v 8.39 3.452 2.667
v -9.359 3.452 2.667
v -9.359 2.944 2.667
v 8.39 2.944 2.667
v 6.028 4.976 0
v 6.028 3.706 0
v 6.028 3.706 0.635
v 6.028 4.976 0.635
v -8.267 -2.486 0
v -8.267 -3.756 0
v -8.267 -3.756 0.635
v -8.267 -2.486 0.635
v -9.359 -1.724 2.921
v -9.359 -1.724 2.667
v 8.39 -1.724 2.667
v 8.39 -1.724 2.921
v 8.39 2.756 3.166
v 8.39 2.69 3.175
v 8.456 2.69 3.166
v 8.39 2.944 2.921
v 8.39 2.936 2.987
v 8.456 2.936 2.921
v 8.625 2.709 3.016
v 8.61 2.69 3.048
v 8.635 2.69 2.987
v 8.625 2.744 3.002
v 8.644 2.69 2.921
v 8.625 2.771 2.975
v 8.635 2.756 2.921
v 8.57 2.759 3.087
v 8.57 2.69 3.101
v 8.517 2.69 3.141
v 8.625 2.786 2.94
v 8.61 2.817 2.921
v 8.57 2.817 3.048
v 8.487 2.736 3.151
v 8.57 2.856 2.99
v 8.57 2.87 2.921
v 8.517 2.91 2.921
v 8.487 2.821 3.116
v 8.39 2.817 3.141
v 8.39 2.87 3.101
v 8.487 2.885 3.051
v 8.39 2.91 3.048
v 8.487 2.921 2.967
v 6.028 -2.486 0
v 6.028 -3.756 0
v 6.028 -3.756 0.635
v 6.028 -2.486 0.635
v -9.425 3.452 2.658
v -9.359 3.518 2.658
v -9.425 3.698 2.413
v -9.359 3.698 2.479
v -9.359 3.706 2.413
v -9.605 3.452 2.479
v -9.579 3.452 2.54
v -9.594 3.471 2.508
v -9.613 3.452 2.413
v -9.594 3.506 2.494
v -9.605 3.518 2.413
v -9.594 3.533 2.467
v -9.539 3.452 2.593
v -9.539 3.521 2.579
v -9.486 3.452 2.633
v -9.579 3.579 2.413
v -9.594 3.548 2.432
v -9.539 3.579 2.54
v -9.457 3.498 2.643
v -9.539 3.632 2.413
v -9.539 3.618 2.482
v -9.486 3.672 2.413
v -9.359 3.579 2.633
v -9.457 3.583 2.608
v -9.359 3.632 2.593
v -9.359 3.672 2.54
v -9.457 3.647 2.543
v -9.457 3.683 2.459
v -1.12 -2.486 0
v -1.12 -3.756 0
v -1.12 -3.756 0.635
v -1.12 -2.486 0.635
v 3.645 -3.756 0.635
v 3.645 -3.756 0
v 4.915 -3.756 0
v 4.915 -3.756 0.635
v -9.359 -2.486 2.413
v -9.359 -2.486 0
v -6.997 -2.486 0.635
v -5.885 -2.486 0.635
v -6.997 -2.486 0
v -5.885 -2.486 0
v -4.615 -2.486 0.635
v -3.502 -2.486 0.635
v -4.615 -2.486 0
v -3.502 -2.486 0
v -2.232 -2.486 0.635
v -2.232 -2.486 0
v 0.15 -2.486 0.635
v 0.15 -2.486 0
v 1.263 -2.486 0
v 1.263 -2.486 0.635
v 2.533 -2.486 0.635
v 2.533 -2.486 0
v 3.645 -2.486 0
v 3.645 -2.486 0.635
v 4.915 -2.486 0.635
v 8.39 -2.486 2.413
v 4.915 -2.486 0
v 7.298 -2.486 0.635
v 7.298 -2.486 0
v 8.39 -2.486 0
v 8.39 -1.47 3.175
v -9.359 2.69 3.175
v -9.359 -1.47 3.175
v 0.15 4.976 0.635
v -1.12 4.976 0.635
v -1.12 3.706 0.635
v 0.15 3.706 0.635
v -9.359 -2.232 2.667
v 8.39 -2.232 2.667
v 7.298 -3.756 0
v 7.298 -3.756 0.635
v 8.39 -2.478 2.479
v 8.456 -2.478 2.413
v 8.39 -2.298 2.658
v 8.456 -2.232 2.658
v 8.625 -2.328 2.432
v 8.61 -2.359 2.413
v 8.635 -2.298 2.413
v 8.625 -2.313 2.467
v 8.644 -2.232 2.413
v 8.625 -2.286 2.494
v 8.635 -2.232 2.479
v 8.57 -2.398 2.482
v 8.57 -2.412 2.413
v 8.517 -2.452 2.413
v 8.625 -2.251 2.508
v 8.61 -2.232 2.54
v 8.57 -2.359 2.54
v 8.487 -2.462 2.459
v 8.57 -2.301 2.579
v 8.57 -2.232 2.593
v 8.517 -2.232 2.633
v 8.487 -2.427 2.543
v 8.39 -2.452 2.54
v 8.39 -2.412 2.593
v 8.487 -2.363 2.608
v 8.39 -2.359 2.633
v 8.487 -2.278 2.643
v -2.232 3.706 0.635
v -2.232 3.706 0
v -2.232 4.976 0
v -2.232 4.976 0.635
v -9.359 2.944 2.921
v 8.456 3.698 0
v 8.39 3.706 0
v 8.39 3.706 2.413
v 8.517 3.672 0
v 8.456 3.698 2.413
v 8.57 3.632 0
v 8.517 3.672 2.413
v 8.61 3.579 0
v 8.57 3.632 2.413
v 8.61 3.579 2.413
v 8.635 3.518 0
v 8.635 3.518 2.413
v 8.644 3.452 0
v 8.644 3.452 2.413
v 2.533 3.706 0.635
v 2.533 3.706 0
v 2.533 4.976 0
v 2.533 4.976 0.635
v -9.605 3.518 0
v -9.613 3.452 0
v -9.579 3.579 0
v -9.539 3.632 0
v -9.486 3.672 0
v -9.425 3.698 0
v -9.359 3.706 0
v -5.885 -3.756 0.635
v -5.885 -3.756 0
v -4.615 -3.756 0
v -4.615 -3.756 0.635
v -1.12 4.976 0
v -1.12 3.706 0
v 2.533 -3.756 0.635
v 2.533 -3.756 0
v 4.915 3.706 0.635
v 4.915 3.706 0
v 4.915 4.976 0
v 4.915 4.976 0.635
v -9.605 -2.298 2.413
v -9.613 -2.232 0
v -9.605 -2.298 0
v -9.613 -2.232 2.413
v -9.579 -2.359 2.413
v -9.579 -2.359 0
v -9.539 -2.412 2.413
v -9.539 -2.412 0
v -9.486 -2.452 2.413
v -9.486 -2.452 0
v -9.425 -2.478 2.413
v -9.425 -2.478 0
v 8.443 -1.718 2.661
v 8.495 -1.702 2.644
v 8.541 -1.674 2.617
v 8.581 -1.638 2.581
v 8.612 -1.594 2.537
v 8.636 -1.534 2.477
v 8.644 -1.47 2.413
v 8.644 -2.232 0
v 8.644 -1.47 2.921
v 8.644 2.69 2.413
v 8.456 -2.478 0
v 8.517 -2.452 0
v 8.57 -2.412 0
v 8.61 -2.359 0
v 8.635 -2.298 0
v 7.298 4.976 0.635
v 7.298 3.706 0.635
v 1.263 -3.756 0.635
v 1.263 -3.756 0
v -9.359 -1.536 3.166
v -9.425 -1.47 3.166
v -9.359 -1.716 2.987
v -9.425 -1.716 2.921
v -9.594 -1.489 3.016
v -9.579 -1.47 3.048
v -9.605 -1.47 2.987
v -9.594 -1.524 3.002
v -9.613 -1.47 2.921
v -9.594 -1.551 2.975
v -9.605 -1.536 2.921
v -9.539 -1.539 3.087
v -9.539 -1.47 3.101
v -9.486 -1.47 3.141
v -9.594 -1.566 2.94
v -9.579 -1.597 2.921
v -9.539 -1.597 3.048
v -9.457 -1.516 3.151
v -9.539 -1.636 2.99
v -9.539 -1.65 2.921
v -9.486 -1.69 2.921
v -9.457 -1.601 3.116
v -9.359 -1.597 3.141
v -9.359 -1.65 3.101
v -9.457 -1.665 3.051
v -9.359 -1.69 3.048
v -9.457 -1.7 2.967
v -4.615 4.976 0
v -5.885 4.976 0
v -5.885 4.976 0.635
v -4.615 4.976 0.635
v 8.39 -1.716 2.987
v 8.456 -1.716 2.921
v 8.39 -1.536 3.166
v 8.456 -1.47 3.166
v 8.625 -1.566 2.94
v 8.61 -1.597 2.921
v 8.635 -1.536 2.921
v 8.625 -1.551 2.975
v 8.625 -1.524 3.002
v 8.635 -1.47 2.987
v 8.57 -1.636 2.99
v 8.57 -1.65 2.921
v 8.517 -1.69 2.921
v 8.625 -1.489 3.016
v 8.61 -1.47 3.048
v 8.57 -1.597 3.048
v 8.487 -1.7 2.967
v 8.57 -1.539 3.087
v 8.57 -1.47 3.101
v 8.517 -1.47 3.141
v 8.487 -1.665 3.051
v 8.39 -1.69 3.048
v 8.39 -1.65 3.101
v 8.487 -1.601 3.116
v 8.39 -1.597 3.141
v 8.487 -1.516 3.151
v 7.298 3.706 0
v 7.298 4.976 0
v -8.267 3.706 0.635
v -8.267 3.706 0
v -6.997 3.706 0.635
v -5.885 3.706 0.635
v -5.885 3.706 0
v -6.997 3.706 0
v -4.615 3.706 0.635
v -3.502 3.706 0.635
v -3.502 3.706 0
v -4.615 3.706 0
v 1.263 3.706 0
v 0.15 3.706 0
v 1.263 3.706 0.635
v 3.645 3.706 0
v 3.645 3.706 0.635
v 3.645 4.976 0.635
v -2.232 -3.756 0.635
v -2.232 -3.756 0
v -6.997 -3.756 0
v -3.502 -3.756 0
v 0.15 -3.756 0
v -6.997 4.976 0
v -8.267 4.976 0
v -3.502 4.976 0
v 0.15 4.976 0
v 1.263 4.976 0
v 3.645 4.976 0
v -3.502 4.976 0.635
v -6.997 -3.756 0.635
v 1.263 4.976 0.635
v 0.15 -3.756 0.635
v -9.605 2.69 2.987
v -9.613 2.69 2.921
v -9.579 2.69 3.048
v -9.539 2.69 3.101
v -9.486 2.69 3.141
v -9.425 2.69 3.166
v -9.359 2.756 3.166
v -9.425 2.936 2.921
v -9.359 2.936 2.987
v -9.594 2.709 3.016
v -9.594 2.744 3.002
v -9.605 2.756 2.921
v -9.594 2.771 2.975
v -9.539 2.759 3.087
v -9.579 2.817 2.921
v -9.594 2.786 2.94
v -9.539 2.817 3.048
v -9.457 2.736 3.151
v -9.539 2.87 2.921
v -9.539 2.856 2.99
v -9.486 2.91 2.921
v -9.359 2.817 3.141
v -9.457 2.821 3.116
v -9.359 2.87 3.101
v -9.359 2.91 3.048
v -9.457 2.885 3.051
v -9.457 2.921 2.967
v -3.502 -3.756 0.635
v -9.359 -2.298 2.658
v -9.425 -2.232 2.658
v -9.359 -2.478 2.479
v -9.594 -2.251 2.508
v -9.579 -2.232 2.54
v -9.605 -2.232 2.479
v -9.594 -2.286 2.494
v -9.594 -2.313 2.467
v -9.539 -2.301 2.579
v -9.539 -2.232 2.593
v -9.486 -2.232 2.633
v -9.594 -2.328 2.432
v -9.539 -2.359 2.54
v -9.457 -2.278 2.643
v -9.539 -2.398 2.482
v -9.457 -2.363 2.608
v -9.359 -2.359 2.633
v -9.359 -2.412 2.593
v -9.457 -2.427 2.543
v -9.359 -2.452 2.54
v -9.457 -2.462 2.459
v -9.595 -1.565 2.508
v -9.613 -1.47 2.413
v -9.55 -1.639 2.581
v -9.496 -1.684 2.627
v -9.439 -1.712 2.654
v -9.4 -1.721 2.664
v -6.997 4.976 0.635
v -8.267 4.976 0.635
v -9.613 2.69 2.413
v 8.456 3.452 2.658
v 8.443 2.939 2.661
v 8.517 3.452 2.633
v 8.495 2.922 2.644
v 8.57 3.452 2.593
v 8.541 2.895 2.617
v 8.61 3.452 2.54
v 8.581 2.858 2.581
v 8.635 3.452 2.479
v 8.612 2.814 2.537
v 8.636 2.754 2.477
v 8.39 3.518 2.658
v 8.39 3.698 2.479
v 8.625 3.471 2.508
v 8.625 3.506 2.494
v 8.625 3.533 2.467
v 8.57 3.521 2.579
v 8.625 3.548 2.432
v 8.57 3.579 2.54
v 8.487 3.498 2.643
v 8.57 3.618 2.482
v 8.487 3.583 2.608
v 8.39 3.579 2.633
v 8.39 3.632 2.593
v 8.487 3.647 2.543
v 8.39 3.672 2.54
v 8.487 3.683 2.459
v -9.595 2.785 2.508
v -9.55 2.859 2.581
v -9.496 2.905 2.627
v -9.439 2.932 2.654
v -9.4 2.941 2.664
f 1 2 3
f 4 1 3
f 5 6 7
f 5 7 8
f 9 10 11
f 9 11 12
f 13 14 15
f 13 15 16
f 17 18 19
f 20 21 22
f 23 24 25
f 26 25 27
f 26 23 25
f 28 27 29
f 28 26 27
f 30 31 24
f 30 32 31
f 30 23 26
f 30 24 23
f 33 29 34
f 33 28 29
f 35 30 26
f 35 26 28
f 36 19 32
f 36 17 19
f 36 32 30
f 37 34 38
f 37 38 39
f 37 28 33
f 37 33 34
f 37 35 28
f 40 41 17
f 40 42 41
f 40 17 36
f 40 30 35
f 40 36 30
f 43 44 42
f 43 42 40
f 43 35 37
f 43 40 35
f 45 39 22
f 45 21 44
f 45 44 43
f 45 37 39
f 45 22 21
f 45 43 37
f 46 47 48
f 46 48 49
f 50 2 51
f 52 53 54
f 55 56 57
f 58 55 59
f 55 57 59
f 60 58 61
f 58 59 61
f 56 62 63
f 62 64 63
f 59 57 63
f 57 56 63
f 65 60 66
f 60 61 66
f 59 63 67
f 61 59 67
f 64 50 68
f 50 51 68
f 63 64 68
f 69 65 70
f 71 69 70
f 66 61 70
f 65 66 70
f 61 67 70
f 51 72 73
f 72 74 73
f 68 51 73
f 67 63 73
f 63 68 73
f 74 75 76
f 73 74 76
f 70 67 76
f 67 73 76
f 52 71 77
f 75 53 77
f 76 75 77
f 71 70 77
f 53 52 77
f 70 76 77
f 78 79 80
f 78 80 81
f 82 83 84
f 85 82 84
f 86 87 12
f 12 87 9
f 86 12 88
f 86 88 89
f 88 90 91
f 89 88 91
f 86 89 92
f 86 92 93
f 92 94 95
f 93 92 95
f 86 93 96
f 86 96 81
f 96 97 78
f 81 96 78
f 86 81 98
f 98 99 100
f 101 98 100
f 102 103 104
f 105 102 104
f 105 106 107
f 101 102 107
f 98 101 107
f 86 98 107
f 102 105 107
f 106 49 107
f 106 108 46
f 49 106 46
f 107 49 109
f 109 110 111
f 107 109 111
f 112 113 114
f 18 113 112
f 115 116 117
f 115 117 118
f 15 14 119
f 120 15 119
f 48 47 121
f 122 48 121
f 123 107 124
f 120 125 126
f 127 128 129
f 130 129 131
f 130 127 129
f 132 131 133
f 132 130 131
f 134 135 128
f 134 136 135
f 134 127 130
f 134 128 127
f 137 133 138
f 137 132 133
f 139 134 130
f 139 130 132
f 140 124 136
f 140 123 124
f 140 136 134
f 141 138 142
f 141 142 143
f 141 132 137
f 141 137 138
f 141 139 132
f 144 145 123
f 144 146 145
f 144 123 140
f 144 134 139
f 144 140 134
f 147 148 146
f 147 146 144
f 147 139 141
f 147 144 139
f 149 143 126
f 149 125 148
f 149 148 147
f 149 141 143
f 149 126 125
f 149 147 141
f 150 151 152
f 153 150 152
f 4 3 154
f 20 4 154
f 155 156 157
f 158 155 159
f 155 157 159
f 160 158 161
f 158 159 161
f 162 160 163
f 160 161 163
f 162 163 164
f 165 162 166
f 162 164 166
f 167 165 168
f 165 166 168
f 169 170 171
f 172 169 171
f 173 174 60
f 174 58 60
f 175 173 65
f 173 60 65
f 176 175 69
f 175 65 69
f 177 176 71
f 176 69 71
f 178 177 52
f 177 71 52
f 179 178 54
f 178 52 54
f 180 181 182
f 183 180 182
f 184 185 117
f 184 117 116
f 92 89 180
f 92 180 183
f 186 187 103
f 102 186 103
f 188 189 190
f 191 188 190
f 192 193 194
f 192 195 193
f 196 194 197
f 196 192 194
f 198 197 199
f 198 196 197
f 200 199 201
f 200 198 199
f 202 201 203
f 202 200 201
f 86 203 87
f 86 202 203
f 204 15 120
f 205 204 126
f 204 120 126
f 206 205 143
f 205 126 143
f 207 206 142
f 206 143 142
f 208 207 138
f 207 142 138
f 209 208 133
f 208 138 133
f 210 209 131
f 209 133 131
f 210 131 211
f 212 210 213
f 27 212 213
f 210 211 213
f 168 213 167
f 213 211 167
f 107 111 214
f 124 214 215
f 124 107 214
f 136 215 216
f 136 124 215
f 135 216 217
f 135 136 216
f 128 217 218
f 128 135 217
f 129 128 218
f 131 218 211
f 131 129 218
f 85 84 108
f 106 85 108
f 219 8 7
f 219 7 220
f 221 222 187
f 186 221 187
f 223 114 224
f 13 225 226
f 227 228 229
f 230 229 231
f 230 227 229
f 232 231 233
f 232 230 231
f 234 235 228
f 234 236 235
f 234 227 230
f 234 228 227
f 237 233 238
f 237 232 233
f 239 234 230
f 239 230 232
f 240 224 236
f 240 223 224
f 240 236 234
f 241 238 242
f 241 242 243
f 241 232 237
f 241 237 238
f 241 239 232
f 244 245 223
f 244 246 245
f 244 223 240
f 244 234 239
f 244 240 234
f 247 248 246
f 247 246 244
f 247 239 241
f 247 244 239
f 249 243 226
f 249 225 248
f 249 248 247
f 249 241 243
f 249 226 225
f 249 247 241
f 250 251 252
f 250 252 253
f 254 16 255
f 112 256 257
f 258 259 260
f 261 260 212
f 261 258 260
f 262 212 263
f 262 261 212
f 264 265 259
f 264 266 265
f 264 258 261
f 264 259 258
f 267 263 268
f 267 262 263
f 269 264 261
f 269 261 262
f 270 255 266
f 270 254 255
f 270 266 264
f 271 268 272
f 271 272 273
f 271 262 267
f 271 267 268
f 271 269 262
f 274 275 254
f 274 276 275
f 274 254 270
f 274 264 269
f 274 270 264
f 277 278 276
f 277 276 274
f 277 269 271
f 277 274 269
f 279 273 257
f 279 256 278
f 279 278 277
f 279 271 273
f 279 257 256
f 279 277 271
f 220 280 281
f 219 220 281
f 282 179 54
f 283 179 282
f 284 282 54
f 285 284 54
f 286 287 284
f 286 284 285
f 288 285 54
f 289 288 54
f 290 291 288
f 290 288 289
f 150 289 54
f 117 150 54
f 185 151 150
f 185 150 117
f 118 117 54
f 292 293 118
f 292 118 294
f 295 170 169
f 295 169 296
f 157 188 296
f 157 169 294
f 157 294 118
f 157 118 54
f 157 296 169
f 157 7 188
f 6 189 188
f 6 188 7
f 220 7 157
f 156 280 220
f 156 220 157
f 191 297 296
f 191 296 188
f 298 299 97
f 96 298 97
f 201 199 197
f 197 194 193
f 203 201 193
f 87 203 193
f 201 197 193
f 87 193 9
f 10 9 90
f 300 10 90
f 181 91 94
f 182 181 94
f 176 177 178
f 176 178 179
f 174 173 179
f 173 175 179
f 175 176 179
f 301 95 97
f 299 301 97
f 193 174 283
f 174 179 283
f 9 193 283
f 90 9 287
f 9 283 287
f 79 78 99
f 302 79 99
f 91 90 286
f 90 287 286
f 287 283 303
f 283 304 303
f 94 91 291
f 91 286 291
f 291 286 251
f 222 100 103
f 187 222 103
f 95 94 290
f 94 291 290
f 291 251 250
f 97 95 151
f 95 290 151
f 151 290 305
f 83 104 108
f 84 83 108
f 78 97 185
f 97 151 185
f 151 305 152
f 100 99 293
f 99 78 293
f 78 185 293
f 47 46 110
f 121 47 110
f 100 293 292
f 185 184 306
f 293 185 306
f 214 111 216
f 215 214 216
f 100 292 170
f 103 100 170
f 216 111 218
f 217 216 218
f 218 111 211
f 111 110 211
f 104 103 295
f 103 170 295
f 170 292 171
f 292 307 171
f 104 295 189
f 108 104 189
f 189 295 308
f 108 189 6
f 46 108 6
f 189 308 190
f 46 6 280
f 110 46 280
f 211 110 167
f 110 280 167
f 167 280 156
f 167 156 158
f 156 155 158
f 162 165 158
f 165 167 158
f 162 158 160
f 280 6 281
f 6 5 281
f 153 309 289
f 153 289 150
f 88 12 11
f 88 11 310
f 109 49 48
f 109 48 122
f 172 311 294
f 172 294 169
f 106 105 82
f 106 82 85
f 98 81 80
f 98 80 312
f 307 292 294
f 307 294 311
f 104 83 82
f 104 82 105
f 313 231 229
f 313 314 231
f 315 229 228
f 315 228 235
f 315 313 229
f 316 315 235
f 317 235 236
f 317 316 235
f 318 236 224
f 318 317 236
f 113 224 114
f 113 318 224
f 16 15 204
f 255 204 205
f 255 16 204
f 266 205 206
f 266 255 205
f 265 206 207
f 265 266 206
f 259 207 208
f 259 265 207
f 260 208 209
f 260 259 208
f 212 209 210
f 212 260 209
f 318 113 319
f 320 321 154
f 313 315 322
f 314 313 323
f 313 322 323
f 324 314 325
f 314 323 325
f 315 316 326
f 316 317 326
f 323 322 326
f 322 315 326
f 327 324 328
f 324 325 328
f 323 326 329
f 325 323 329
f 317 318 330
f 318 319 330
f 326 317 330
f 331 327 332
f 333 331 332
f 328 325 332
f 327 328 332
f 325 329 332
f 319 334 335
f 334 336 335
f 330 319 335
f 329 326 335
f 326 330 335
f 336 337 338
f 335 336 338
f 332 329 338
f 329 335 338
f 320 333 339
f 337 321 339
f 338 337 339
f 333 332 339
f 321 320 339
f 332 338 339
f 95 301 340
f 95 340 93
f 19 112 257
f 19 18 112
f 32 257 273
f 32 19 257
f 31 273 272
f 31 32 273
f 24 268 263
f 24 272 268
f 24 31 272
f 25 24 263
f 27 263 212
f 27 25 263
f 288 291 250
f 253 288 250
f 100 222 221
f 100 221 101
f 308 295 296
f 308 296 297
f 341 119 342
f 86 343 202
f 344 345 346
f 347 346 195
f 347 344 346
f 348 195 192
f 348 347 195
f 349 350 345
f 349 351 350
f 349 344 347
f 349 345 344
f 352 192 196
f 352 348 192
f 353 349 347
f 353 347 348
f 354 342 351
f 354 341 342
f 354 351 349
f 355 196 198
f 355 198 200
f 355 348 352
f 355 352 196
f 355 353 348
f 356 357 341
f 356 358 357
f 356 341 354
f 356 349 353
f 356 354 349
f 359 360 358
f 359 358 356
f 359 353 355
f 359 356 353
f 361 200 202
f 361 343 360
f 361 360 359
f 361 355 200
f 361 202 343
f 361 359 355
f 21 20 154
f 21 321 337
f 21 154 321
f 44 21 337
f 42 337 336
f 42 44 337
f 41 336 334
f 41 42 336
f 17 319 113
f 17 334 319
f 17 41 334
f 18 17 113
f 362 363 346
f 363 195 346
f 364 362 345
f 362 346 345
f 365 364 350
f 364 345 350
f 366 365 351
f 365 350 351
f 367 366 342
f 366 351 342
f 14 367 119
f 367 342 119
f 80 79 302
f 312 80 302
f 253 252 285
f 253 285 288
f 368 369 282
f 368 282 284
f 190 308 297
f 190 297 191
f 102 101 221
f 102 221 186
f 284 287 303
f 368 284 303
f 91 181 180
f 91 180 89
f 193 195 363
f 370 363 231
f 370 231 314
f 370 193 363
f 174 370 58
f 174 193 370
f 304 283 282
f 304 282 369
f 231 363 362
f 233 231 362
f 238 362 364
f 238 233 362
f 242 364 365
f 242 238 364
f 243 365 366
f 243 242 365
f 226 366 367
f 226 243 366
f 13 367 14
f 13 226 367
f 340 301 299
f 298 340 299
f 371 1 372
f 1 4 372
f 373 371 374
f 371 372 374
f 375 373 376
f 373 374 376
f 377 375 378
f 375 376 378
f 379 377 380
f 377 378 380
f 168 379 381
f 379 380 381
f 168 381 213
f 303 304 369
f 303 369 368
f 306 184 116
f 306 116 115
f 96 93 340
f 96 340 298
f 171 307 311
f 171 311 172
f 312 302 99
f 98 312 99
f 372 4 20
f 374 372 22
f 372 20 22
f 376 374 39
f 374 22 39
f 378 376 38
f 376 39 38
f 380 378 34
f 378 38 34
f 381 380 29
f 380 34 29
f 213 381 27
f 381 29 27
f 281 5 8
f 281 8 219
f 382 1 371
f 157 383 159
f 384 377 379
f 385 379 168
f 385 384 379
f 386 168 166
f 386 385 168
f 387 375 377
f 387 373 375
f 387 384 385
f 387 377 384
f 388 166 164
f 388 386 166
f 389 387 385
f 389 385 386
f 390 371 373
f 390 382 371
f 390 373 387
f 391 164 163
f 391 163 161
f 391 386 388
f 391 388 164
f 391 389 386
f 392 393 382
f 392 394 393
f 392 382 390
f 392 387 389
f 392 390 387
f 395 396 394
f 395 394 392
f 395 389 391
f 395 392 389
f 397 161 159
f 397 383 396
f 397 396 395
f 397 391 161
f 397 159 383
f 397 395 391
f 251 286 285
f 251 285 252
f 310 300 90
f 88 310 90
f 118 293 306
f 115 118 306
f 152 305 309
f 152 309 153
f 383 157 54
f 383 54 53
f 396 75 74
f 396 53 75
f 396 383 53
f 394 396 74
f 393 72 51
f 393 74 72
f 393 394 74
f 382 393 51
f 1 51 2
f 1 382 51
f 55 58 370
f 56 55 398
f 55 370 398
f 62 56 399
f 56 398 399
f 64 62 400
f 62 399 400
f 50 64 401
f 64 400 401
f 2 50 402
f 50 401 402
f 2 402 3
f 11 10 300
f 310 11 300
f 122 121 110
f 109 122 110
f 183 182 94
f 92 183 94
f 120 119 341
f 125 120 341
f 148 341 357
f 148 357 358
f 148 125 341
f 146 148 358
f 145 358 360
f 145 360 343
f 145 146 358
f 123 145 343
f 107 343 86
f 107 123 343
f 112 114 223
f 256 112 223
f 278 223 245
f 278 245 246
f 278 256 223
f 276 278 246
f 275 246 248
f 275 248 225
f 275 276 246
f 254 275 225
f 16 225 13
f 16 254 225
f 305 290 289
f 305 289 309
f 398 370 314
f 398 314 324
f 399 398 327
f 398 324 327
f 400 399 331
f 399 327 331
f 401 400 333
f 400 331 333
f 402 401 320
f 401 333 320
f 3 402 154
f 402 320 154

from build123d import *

# Parameters (mm, degrees)
F0_W     = 18.25752
F0_H     = 6.19252
F1_DEPTH = 3.175
F2_W     = 1.27
F2_H     = 1.27
F3_DEPTH = 0.635
F5_W     = 0.762
F5_H     = 0.508
F6_DEPTH = 25.4
F7_R     = 0.254


with BuildPart() as f1:
    # F0 (on Top) → F1 (new body)
    with BuildSketch(Plane.XY):
        with Locations((-0.4847390454, 0.6100881006)):
            Rectangle(F0_W, F0_H)
    extrude(amount=F1_DEPTH)

    # F2 (on Top) → F3 (join)
    with BuildSketch(Plane.XY):
        with Locations((-7.6322990454, 4.3413481006)):
            Rectangle(F2_W, F2_H)
        with Locations((-5.2497790454, 4.3413481006)):
            Rectangle(F2_W, F2_H)
        with Locations((-2.8672590454, 4.3413481006)):
            Rectangle(F2_W, F2_H)
        with Locations((-0.4847390454, 4.3413481006)):
            Rectangle(F2_W, F2_H)
        with Locations((1.8977809546, 4.3413481006)):
            Rectangle(F2_W, F2_H)
        with Locations((4.2803009546, 4.3413481006)):
            Rectangle(F2_W, F2_H)
        with Locations((6.6628209546, 4.3413481006)):
            Rectangle(F2_W, F2_H)
        with Locations((-7.6322990454, -3.1211718994)):
            Rectangle(F2_W, F2_H)
        with Locations((-5.2497790454, -3.1211718994)):
            Rectangle(F2_W, F2_H)
        with Locations((-2.8672590454, -3.1211718994)):
            Rectangle(F2_W, F2_H)
        with Locations((-0.4847390454, -3.1211718994)):
            Rectangle(F2_W, F2_H)
        with Locations((1.8977809546, -3.1211718994)):
            Rectangle(F2_W, F2_H)
        with Locations((4.2803009546, -3.1211718994)):
            Rectangle(F2_W, F2_H)
        with Locations((6.6628209546, -3.1211718994)):
            Rectangle(F2_W, F2_H)
    extrude(amount=F3_DEPTH)

    # F5 (on face) → F6 (cut)
    with BuildSketch(Plane(origin=(-9.6134990454, 0, 0), x_dir=(0, -1, 0), z_dir=(-1, 0, 0))):
        with Locations((-3.3253481006, 2.921)):
            Rectangle(F5_W, F5_H)
        with Locations((2.1051718994, 2.921)):
            Rectangle(F5_W, F5_H)
    extrude(amount=-F6_DEPTH, mode=Mode.SUBTRACT)

    # F7
    f7_edges = [f1.edges().sort_by_distance(p)[0] for p in [
        (-0.484739, 3.706348, 2.667),
        (-0.484739, 2.944348, 3.175),
        (-0.484739, -1.724172, 3.175),
        (-0.484739, -2.486172, 2.667),
        (-9.613499, 0.610088, 3.175),
        (-9.613499, -1.724172, 2.921),
        (-9.613499, -2.105172, 2.667),
        (-9.613499, -2.486172, 1.3335),
        (-9.613499, 3.325348, 2.667),
        (-9.613499, 2.944348, 2.921),
        (-9.613499, 3.706348, 1.3335),
        (8.644021, -2.486172, 1.3335),
        (8.644021, -2.105172, 2.667),
        (8.644021, -1.724172, 2.921),
        (8.644021, 0.610088, 3.175),
        (8.644021, 2.944348, 2.921),
        (8.644021, 3.325348, 2.667),
        (8.644021, 3.706348, 1.3335),
    ]]
    fillet(f7_edges, radius=F7_R)


solid = f1.part
